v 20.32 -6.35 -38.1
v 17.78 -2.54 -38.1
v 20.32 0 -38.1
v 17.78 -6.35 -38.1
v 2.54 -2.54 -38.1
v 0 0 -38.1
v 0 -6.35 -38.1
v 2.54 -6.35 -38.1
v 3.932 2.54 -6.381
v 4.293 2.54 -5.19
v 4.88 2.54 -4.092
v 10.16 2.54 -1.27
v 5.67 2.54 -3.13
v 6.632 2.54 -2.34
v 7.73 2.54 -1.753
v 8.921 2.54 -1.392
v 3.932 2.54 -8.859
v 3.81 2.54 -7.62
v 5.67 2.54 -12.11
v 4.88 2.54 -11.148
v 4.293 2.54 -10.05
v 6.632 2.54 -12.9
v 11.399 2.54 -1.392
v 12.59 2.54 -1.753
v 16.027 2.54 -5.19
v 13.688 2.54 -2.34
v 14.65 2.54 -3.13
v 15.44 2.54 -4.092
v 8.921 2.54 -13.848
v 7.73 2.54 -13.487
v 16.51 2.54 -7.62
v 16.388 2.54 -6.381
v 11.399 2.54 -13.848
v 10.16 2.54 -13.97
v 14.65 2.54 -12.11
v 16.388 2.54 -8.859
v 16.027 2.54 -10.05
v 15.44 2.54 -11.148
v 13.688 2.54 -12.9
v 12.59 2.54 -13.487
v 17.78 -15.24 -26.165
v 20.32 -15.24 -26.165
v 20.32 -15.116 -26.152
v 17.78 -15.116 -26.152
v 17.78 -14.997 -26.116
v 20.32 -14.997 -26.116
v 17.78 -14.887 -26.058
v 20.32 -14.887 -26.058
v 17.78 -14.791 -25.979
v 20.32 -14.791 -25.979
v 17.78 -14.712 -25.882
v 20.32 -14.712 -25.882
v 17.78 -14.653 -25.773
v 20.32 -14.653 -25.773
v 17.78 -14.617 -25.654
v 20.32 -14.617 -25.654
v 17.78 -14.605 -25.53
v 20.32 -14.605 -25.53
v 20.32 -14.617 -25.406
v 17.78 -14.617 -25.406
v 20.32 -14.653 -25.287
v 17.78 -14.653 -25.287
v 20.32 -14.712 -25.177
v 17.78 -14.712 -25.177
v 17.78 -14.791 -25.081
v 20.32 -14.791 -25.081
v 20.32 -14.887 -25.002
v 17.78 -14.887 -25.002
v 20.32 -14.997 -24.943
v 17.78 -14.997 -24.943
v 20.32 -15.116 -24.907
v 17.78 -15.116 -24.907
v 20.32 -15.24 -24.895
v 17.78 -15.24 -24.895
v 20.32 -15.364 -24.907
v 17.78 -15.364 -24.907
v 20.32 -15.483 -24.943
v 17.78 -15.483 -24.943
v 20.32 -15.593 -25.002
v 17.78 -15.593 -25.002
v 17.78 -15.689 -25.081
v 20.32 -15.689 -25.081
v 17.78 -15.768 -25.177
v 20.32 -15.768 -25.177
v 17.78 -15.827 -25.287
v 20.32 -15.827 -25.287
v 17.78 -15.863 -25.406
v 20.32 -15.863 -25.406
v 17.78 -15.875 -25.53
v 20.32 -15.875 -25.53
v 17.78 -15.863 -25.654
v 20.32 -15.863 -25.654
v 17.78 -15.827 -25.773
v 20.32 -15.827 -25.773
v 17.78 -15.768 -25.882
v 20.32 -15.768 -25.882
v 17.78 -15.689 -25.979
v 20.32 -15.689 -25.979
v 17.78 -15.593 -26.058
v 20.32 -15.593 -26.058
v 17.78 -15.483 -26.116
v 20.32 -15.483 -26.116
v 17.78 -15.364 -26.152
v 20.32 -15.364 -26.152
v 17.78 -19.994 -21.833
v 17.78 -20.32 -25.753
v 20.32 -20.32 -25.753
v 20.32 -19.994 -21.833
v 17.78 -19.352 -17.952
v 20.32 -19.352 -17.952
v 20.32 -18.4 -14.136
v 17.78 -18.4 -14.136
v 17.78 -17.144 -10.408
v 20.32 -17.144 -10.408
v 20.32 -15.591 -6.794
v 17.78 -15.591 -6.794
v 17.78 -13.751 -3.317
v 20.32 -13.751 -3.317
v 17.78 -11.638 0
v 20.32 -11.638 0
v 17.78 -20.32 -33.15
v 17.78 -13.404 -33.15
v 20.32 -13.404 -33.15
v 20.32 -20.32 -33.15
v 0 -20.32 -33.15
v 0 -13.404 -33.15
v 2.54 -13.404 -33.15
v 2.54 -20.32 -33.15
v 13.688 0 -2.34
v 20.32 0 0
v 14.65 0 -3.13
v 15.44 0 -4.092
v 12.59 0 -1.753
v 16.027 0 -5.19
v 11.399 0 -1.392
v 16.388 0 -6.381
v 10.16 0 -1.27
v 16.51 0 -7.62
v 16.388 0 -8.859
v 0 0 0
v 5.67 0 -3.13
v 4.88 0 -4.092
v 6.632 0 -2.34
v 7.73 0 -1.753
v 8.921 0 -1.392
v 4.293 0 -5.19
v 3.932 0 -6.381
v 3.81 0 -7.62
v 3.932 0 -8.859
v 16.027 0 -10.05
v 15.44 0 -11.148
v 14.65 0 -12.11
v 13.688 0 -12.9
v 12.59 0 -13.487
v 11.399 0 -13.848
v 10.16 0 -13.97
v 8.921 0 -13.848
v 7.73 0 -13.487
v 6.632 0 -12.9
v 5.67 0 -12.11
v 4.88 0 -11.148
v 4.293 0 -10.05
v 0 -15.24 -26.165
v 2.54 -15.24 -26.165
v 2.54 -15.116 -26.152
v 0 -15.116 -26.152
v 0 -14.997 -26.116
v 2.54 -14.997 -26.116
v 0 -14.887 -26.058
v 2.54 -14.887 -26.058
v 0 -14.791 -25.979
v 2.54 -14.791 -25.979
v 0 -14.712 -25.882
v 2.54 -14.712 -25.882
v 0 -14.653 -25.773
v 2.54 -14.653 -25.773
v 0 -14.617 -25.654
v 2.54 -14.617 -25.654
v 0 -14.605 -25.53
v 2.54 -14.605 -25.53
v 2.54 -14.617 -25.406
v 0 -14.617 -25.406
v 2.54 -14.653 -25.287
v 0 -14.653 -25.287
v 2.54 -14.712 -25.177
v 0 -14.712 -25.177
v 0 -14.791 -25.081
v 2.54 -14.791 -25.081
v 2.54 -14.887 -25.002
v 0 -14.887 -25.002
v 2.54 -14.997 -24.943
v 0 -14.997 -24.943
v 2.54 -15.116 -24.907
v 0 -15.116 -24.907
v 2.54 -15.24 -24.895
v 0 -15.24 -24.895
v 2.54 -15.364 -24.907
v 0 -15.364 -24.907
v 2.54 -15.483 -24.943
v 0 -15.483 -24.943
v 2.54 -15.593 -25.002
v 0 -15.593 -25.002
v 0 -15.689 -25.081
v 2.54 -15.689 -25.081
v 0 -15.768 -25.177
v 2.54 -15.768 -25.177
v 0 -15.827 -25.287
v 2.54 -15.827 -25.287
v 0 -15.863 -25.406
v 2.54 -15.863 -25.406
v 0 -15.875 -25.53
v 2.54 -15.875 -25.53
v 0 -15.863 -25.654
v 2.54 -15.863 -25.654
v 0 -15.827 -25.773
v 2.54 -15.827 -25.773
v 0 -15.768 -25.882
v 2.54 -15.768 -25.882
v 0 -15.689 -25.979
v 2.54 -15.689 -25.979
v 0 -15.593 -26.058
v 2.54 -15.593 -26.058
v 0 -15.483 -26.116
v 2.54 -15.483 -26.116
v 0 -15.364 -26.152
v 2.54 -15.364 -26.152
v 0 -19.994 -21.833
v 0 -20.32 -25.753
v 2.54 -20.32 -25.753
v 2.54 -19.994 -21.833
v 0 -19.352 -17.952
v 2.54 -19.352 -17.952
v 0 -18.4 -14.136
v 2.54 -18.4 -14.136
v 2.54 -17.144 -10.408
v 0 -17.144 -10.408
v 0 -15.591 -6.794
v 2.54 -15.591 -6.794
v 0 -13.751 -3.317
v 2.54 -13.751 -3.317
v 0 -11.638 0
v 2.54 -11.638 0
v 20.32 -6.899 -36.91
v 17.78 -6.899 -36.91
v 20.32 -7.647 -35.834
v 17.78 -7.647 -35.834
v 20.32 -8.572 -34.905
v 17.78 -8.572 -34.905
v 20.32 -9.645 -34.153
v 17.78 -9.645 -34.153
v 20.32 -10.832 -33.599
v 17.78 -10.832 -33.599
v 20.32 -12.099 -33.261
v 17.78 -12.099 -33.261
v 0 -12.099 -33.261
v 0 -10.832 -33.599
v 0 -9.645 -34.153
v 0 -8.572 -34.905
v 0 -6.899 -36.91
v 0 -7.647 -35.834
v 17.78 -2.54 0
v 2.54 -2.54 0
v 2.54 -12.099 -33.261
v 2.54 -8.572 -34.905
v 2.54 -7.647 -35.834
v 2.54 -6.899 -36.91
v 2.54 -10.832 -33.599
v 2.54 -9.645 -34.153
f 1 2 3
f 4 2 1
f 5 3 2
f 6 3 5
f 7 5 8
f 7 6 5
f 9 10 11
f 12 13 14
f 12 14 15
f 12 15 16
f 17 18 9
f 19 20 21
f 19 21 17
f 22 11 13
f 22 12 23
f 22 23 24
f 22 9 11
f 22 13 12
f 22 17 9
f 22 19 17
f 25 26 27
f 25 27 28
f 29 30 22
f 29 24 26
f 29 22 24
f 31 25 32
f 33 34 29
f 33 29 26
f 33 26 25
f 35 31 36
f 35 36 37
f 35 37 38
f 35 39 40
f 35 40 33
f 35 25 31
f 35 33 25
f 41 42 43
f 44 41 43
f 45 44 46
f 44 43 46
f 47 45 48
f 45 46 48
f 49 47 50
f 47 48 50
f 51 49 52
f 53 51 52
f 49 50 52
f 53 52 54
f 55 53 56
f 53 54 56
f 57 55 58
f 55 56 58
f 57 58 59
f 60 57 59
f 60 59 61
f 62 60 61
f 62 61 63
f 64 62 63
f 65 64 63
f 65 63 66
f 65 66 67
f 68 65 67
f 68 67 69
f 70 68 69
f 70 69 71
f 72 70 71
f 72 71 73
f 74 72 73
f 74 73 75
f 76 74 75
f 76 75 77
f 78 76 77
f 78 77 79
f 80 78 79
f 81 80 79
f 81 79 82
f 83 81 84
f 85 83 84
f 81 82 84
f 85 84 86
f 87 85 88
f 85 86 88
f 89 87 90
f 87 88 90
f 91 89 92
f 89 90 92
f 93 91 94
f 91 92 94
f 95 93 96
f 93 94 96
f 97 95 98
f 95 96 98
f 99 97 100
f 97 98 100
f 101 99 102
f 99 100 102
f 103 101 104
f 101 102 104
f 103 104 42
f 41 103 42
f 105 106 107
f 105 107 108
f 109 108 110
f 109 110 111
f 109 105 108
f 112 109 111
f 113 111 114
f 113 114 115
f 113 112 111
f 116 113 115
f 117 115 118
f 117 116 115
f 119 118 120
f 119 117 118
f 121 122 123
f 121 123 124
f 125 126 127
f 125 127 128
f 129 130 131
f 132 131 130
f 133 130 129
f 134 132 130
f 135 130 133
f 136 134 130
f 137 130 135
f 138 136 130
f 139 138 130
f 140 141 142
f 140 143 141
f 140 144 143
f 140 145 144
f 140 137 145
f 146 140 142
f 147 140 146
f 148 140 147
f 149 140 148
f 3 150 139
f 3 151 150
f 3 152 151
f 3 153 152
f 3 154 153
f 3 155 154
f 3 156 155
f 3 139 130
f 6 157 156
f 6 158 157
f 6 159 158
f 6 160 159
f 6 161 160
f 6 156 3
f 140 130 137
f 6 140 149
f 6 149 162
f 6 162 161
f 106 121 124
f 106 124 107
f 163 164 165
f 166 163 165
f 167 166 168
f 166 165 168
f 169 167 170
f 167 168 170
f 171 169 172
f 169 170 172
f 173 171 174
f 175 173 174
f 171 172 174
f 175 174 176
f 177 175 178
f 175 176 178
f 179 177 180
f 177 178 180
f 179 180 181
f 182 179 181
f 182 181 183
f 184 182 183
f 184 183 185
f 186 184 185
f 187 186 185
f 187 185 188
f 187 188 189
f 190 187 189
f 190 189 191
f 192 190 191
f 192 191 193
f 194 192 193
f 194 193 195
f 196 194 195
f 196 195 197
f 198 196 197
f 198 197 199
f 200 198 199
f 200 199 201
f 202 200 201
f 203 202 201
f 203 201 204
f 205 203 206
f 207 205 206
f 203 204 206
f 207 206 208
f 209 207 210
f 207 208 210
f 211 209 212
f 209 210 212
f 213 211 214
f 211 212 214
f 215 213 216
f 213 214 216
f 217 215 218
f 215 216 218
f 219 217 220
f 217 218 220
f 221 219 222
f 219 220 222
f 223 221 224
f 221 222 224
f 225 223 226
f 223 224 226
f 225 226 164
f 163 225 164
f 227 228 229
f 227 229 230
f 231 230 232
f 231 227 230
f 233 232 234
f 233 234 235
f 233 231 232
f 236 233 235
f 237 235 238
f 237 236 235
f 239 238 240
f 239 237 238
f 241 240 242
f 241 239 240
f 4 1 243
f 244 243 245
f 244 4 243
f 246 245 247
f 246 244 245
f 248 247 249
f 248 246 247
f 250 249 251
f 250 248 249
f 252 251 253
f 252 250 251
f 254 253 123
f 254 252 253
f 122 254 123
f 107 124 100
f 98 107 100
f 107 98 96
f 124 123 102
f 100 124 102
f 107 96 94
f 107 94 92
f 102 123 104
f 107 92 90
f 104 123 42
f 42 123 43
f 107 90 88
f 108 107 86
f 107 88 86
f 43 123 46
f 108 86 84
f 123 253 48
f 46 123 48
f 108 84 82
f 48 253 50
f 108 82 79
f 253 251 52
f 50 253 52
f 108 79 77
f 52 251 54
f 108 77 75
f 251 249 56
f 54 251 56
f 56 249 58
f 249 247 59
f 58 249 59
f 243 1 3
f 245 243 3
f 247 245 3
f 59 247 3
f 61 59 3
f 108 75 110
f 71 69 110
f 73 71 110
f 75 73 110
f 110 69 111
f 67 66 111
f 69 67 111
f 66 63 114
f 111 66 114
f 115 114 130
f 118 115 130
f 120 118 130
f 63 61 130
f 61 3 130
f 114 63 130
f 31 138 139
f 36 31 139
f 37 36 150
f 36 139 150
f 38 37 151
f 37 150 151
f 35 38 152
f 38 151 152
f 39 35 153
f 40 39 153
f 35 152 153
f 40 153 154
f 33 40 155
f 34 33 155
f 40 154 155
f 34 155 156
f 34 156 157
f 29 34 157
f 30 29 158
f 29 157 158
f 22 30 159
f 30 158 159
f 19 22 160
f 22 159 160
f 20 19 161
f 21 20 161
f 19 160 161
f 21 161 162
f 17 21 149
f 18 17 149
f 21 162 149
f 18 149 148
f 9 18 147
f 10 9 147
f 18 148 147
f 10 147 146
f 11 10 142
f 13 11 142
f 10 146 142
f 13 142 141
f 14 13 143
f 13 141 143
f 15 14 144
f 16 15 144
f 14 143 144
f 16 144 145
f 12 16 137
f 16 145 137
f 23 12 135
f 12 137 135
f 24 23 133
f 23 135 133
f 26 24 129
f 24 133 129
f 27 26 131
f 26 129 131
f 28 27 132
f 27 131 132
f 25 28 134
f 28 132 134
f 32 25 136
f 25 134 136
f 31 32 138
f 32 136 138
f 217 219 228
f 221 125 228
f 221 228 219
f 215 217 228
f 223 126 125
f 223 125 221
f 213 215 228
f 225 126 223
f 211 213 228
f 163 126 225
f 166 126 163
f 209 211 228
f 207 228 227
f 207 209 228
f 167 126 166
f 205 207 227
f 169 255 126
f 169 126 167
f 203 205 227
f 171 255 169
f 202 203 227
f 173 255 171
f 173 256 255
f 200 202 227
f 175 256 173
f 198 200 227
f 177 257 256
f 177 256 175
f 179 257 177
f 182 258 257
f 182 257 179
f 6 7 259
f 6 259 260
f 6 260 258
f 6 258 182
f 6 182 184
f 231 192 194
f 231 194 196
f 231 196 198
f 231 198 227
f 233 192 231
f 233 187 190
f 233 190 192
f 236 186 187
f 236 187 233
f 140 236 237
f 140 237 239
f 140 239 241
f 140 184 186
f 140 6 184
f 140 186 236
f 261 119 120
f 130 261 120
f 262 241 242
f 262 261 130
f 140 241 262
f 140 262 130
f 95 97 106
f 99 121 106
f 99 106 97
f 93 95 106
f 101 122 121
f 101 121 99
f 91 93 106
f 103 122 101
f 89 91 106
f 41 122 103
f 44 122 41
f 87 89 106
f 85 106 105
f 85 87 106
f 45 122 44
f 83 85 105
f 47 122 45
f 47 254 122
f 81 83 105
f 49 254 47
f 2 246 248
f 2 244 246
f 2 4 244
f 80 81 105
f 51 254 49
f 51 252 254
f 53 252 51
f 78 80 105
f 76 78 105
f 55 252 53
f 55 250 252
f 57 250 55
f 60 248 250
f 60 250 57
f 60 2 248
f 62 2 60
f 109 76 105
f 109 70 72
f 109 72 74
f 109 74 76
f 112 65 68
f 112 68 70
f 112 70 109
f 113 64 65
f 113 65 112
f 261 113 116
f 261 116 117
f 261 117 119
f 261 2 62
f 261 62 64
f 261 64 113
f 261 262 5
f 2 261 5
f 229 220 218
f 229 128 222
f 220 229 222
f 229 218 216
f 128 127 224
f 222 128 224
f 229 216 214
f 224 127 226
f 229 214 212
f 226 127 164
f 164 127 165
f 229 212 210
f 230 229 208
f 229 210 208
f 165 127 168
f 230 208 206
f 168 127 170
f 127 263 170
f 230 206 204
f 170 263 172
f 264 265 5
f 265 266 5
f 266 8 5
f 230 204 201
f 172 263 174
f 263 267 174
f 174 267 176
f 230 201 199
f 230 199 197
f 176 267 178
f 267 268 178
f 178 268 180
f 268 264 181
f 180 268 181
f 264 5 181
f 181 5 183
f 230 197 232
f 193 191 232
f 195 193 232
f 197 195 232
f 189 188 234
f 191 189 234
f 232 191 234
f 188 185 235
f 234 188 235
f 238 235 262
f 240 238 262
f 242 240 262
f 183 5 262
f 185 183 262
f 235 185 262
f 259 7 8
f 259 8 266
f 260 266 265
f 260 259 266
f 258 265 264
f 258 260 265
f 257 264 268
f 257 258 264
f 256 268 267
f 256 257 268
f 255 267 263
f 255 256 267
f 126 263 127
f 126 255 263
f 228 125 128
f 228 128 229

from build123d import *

# Parameters (mm, degrees)
BOSS_EXTRUDE1_DEPTH     = 20.32
SHELL1_T                = -2.54
SKETCH3_R               = 6.35
BOSS_EXTRUDE2_DEPTH     = 2.54
SKETCH5_R               = 0.635
CUT_EXTRUDE2_DEPTH      = 1
CUT_EXTRUDE2_DEPTH_BACK = 21.32


with BuildPart() as part:
    # Sketch2 → Boss-Extrude1 (new body)
    with BuildSketch(Plane(origin=(0, 0, 0), x_dir=(0, 0, -1), z_dir=(1, 0, 0))):
        with BuildLine():
            Line((0, 0), (38.1, 0))
            Line((38.1, 0), (38.1, -6.35))
            ThreePointArc((38.1, -6.35), (34.505388745, -9.09166098), (33.149673366, -13.404429327))
            Line((33.149673366, -13.404429327), (33.149673366, -20.32))
            Line((33.149673366, -20.32), (25.753107907, -20.32))
            ThreePointArc((25.753107907, -20.32), (12.259334003, -17.809647323), (0, -11.637732342))
            Line((0, -11.637732342), (0, 0))
        make_face()
    extrude(amount=BOSS_EXTRUDE1_DEPTH)

    # Shell1
    shell1_openings = [part.faces().sort_by_distance(p)[0] for p in [
        (10.16, -3.175, -38.1),
        (10.16, -9.484437822, -35.065112714),
        (10.16, -16.862214664, -33.149673366),
        (10.16, -20.32, -29.451390636),
        (10.16, -16.894256747, -12.567943978),
        (10.16, -5.818866171, 0),
    ]]
    offset(amount=SHELL1_T, openings=shell1_openings, kind=Kind.INTERSECTION)

    # Sketch3 → Boss-Extrude2 (add)
    with BuildSketch(Plane(origin=(0, 0, 0), x_dir=(1, 0, 0), z_dir=(0, 1, 0))):
        with Locations((10.16, 7.62)):
            Circle(SKETCH3_R)
    extrude(amount=BOSS_EXTRUDE2_DEPTH)

    # Sketch5 → Cut-Extrude2 (cut, two sides)
    with BuildSketch(Plane(origin=(20.32, 0, 0), x_dir=(0, 0, -1), z_dir=(1, 0, 0))) as cut_extrude2_sk:
        with Locations((25.529673366, -15.24)):
            Circle(SKETCH5_R)
    extrude(amount=CUT_EXTRUDE2_DEPTH, mode=Mode.SUBTRACT)
    extrude(cut_extrude2_sk.sketch, amount=-CUT_EXTRUDE2_DEPTH_BACK, mode=Mode.SUBTRACT)


solid = part.part
